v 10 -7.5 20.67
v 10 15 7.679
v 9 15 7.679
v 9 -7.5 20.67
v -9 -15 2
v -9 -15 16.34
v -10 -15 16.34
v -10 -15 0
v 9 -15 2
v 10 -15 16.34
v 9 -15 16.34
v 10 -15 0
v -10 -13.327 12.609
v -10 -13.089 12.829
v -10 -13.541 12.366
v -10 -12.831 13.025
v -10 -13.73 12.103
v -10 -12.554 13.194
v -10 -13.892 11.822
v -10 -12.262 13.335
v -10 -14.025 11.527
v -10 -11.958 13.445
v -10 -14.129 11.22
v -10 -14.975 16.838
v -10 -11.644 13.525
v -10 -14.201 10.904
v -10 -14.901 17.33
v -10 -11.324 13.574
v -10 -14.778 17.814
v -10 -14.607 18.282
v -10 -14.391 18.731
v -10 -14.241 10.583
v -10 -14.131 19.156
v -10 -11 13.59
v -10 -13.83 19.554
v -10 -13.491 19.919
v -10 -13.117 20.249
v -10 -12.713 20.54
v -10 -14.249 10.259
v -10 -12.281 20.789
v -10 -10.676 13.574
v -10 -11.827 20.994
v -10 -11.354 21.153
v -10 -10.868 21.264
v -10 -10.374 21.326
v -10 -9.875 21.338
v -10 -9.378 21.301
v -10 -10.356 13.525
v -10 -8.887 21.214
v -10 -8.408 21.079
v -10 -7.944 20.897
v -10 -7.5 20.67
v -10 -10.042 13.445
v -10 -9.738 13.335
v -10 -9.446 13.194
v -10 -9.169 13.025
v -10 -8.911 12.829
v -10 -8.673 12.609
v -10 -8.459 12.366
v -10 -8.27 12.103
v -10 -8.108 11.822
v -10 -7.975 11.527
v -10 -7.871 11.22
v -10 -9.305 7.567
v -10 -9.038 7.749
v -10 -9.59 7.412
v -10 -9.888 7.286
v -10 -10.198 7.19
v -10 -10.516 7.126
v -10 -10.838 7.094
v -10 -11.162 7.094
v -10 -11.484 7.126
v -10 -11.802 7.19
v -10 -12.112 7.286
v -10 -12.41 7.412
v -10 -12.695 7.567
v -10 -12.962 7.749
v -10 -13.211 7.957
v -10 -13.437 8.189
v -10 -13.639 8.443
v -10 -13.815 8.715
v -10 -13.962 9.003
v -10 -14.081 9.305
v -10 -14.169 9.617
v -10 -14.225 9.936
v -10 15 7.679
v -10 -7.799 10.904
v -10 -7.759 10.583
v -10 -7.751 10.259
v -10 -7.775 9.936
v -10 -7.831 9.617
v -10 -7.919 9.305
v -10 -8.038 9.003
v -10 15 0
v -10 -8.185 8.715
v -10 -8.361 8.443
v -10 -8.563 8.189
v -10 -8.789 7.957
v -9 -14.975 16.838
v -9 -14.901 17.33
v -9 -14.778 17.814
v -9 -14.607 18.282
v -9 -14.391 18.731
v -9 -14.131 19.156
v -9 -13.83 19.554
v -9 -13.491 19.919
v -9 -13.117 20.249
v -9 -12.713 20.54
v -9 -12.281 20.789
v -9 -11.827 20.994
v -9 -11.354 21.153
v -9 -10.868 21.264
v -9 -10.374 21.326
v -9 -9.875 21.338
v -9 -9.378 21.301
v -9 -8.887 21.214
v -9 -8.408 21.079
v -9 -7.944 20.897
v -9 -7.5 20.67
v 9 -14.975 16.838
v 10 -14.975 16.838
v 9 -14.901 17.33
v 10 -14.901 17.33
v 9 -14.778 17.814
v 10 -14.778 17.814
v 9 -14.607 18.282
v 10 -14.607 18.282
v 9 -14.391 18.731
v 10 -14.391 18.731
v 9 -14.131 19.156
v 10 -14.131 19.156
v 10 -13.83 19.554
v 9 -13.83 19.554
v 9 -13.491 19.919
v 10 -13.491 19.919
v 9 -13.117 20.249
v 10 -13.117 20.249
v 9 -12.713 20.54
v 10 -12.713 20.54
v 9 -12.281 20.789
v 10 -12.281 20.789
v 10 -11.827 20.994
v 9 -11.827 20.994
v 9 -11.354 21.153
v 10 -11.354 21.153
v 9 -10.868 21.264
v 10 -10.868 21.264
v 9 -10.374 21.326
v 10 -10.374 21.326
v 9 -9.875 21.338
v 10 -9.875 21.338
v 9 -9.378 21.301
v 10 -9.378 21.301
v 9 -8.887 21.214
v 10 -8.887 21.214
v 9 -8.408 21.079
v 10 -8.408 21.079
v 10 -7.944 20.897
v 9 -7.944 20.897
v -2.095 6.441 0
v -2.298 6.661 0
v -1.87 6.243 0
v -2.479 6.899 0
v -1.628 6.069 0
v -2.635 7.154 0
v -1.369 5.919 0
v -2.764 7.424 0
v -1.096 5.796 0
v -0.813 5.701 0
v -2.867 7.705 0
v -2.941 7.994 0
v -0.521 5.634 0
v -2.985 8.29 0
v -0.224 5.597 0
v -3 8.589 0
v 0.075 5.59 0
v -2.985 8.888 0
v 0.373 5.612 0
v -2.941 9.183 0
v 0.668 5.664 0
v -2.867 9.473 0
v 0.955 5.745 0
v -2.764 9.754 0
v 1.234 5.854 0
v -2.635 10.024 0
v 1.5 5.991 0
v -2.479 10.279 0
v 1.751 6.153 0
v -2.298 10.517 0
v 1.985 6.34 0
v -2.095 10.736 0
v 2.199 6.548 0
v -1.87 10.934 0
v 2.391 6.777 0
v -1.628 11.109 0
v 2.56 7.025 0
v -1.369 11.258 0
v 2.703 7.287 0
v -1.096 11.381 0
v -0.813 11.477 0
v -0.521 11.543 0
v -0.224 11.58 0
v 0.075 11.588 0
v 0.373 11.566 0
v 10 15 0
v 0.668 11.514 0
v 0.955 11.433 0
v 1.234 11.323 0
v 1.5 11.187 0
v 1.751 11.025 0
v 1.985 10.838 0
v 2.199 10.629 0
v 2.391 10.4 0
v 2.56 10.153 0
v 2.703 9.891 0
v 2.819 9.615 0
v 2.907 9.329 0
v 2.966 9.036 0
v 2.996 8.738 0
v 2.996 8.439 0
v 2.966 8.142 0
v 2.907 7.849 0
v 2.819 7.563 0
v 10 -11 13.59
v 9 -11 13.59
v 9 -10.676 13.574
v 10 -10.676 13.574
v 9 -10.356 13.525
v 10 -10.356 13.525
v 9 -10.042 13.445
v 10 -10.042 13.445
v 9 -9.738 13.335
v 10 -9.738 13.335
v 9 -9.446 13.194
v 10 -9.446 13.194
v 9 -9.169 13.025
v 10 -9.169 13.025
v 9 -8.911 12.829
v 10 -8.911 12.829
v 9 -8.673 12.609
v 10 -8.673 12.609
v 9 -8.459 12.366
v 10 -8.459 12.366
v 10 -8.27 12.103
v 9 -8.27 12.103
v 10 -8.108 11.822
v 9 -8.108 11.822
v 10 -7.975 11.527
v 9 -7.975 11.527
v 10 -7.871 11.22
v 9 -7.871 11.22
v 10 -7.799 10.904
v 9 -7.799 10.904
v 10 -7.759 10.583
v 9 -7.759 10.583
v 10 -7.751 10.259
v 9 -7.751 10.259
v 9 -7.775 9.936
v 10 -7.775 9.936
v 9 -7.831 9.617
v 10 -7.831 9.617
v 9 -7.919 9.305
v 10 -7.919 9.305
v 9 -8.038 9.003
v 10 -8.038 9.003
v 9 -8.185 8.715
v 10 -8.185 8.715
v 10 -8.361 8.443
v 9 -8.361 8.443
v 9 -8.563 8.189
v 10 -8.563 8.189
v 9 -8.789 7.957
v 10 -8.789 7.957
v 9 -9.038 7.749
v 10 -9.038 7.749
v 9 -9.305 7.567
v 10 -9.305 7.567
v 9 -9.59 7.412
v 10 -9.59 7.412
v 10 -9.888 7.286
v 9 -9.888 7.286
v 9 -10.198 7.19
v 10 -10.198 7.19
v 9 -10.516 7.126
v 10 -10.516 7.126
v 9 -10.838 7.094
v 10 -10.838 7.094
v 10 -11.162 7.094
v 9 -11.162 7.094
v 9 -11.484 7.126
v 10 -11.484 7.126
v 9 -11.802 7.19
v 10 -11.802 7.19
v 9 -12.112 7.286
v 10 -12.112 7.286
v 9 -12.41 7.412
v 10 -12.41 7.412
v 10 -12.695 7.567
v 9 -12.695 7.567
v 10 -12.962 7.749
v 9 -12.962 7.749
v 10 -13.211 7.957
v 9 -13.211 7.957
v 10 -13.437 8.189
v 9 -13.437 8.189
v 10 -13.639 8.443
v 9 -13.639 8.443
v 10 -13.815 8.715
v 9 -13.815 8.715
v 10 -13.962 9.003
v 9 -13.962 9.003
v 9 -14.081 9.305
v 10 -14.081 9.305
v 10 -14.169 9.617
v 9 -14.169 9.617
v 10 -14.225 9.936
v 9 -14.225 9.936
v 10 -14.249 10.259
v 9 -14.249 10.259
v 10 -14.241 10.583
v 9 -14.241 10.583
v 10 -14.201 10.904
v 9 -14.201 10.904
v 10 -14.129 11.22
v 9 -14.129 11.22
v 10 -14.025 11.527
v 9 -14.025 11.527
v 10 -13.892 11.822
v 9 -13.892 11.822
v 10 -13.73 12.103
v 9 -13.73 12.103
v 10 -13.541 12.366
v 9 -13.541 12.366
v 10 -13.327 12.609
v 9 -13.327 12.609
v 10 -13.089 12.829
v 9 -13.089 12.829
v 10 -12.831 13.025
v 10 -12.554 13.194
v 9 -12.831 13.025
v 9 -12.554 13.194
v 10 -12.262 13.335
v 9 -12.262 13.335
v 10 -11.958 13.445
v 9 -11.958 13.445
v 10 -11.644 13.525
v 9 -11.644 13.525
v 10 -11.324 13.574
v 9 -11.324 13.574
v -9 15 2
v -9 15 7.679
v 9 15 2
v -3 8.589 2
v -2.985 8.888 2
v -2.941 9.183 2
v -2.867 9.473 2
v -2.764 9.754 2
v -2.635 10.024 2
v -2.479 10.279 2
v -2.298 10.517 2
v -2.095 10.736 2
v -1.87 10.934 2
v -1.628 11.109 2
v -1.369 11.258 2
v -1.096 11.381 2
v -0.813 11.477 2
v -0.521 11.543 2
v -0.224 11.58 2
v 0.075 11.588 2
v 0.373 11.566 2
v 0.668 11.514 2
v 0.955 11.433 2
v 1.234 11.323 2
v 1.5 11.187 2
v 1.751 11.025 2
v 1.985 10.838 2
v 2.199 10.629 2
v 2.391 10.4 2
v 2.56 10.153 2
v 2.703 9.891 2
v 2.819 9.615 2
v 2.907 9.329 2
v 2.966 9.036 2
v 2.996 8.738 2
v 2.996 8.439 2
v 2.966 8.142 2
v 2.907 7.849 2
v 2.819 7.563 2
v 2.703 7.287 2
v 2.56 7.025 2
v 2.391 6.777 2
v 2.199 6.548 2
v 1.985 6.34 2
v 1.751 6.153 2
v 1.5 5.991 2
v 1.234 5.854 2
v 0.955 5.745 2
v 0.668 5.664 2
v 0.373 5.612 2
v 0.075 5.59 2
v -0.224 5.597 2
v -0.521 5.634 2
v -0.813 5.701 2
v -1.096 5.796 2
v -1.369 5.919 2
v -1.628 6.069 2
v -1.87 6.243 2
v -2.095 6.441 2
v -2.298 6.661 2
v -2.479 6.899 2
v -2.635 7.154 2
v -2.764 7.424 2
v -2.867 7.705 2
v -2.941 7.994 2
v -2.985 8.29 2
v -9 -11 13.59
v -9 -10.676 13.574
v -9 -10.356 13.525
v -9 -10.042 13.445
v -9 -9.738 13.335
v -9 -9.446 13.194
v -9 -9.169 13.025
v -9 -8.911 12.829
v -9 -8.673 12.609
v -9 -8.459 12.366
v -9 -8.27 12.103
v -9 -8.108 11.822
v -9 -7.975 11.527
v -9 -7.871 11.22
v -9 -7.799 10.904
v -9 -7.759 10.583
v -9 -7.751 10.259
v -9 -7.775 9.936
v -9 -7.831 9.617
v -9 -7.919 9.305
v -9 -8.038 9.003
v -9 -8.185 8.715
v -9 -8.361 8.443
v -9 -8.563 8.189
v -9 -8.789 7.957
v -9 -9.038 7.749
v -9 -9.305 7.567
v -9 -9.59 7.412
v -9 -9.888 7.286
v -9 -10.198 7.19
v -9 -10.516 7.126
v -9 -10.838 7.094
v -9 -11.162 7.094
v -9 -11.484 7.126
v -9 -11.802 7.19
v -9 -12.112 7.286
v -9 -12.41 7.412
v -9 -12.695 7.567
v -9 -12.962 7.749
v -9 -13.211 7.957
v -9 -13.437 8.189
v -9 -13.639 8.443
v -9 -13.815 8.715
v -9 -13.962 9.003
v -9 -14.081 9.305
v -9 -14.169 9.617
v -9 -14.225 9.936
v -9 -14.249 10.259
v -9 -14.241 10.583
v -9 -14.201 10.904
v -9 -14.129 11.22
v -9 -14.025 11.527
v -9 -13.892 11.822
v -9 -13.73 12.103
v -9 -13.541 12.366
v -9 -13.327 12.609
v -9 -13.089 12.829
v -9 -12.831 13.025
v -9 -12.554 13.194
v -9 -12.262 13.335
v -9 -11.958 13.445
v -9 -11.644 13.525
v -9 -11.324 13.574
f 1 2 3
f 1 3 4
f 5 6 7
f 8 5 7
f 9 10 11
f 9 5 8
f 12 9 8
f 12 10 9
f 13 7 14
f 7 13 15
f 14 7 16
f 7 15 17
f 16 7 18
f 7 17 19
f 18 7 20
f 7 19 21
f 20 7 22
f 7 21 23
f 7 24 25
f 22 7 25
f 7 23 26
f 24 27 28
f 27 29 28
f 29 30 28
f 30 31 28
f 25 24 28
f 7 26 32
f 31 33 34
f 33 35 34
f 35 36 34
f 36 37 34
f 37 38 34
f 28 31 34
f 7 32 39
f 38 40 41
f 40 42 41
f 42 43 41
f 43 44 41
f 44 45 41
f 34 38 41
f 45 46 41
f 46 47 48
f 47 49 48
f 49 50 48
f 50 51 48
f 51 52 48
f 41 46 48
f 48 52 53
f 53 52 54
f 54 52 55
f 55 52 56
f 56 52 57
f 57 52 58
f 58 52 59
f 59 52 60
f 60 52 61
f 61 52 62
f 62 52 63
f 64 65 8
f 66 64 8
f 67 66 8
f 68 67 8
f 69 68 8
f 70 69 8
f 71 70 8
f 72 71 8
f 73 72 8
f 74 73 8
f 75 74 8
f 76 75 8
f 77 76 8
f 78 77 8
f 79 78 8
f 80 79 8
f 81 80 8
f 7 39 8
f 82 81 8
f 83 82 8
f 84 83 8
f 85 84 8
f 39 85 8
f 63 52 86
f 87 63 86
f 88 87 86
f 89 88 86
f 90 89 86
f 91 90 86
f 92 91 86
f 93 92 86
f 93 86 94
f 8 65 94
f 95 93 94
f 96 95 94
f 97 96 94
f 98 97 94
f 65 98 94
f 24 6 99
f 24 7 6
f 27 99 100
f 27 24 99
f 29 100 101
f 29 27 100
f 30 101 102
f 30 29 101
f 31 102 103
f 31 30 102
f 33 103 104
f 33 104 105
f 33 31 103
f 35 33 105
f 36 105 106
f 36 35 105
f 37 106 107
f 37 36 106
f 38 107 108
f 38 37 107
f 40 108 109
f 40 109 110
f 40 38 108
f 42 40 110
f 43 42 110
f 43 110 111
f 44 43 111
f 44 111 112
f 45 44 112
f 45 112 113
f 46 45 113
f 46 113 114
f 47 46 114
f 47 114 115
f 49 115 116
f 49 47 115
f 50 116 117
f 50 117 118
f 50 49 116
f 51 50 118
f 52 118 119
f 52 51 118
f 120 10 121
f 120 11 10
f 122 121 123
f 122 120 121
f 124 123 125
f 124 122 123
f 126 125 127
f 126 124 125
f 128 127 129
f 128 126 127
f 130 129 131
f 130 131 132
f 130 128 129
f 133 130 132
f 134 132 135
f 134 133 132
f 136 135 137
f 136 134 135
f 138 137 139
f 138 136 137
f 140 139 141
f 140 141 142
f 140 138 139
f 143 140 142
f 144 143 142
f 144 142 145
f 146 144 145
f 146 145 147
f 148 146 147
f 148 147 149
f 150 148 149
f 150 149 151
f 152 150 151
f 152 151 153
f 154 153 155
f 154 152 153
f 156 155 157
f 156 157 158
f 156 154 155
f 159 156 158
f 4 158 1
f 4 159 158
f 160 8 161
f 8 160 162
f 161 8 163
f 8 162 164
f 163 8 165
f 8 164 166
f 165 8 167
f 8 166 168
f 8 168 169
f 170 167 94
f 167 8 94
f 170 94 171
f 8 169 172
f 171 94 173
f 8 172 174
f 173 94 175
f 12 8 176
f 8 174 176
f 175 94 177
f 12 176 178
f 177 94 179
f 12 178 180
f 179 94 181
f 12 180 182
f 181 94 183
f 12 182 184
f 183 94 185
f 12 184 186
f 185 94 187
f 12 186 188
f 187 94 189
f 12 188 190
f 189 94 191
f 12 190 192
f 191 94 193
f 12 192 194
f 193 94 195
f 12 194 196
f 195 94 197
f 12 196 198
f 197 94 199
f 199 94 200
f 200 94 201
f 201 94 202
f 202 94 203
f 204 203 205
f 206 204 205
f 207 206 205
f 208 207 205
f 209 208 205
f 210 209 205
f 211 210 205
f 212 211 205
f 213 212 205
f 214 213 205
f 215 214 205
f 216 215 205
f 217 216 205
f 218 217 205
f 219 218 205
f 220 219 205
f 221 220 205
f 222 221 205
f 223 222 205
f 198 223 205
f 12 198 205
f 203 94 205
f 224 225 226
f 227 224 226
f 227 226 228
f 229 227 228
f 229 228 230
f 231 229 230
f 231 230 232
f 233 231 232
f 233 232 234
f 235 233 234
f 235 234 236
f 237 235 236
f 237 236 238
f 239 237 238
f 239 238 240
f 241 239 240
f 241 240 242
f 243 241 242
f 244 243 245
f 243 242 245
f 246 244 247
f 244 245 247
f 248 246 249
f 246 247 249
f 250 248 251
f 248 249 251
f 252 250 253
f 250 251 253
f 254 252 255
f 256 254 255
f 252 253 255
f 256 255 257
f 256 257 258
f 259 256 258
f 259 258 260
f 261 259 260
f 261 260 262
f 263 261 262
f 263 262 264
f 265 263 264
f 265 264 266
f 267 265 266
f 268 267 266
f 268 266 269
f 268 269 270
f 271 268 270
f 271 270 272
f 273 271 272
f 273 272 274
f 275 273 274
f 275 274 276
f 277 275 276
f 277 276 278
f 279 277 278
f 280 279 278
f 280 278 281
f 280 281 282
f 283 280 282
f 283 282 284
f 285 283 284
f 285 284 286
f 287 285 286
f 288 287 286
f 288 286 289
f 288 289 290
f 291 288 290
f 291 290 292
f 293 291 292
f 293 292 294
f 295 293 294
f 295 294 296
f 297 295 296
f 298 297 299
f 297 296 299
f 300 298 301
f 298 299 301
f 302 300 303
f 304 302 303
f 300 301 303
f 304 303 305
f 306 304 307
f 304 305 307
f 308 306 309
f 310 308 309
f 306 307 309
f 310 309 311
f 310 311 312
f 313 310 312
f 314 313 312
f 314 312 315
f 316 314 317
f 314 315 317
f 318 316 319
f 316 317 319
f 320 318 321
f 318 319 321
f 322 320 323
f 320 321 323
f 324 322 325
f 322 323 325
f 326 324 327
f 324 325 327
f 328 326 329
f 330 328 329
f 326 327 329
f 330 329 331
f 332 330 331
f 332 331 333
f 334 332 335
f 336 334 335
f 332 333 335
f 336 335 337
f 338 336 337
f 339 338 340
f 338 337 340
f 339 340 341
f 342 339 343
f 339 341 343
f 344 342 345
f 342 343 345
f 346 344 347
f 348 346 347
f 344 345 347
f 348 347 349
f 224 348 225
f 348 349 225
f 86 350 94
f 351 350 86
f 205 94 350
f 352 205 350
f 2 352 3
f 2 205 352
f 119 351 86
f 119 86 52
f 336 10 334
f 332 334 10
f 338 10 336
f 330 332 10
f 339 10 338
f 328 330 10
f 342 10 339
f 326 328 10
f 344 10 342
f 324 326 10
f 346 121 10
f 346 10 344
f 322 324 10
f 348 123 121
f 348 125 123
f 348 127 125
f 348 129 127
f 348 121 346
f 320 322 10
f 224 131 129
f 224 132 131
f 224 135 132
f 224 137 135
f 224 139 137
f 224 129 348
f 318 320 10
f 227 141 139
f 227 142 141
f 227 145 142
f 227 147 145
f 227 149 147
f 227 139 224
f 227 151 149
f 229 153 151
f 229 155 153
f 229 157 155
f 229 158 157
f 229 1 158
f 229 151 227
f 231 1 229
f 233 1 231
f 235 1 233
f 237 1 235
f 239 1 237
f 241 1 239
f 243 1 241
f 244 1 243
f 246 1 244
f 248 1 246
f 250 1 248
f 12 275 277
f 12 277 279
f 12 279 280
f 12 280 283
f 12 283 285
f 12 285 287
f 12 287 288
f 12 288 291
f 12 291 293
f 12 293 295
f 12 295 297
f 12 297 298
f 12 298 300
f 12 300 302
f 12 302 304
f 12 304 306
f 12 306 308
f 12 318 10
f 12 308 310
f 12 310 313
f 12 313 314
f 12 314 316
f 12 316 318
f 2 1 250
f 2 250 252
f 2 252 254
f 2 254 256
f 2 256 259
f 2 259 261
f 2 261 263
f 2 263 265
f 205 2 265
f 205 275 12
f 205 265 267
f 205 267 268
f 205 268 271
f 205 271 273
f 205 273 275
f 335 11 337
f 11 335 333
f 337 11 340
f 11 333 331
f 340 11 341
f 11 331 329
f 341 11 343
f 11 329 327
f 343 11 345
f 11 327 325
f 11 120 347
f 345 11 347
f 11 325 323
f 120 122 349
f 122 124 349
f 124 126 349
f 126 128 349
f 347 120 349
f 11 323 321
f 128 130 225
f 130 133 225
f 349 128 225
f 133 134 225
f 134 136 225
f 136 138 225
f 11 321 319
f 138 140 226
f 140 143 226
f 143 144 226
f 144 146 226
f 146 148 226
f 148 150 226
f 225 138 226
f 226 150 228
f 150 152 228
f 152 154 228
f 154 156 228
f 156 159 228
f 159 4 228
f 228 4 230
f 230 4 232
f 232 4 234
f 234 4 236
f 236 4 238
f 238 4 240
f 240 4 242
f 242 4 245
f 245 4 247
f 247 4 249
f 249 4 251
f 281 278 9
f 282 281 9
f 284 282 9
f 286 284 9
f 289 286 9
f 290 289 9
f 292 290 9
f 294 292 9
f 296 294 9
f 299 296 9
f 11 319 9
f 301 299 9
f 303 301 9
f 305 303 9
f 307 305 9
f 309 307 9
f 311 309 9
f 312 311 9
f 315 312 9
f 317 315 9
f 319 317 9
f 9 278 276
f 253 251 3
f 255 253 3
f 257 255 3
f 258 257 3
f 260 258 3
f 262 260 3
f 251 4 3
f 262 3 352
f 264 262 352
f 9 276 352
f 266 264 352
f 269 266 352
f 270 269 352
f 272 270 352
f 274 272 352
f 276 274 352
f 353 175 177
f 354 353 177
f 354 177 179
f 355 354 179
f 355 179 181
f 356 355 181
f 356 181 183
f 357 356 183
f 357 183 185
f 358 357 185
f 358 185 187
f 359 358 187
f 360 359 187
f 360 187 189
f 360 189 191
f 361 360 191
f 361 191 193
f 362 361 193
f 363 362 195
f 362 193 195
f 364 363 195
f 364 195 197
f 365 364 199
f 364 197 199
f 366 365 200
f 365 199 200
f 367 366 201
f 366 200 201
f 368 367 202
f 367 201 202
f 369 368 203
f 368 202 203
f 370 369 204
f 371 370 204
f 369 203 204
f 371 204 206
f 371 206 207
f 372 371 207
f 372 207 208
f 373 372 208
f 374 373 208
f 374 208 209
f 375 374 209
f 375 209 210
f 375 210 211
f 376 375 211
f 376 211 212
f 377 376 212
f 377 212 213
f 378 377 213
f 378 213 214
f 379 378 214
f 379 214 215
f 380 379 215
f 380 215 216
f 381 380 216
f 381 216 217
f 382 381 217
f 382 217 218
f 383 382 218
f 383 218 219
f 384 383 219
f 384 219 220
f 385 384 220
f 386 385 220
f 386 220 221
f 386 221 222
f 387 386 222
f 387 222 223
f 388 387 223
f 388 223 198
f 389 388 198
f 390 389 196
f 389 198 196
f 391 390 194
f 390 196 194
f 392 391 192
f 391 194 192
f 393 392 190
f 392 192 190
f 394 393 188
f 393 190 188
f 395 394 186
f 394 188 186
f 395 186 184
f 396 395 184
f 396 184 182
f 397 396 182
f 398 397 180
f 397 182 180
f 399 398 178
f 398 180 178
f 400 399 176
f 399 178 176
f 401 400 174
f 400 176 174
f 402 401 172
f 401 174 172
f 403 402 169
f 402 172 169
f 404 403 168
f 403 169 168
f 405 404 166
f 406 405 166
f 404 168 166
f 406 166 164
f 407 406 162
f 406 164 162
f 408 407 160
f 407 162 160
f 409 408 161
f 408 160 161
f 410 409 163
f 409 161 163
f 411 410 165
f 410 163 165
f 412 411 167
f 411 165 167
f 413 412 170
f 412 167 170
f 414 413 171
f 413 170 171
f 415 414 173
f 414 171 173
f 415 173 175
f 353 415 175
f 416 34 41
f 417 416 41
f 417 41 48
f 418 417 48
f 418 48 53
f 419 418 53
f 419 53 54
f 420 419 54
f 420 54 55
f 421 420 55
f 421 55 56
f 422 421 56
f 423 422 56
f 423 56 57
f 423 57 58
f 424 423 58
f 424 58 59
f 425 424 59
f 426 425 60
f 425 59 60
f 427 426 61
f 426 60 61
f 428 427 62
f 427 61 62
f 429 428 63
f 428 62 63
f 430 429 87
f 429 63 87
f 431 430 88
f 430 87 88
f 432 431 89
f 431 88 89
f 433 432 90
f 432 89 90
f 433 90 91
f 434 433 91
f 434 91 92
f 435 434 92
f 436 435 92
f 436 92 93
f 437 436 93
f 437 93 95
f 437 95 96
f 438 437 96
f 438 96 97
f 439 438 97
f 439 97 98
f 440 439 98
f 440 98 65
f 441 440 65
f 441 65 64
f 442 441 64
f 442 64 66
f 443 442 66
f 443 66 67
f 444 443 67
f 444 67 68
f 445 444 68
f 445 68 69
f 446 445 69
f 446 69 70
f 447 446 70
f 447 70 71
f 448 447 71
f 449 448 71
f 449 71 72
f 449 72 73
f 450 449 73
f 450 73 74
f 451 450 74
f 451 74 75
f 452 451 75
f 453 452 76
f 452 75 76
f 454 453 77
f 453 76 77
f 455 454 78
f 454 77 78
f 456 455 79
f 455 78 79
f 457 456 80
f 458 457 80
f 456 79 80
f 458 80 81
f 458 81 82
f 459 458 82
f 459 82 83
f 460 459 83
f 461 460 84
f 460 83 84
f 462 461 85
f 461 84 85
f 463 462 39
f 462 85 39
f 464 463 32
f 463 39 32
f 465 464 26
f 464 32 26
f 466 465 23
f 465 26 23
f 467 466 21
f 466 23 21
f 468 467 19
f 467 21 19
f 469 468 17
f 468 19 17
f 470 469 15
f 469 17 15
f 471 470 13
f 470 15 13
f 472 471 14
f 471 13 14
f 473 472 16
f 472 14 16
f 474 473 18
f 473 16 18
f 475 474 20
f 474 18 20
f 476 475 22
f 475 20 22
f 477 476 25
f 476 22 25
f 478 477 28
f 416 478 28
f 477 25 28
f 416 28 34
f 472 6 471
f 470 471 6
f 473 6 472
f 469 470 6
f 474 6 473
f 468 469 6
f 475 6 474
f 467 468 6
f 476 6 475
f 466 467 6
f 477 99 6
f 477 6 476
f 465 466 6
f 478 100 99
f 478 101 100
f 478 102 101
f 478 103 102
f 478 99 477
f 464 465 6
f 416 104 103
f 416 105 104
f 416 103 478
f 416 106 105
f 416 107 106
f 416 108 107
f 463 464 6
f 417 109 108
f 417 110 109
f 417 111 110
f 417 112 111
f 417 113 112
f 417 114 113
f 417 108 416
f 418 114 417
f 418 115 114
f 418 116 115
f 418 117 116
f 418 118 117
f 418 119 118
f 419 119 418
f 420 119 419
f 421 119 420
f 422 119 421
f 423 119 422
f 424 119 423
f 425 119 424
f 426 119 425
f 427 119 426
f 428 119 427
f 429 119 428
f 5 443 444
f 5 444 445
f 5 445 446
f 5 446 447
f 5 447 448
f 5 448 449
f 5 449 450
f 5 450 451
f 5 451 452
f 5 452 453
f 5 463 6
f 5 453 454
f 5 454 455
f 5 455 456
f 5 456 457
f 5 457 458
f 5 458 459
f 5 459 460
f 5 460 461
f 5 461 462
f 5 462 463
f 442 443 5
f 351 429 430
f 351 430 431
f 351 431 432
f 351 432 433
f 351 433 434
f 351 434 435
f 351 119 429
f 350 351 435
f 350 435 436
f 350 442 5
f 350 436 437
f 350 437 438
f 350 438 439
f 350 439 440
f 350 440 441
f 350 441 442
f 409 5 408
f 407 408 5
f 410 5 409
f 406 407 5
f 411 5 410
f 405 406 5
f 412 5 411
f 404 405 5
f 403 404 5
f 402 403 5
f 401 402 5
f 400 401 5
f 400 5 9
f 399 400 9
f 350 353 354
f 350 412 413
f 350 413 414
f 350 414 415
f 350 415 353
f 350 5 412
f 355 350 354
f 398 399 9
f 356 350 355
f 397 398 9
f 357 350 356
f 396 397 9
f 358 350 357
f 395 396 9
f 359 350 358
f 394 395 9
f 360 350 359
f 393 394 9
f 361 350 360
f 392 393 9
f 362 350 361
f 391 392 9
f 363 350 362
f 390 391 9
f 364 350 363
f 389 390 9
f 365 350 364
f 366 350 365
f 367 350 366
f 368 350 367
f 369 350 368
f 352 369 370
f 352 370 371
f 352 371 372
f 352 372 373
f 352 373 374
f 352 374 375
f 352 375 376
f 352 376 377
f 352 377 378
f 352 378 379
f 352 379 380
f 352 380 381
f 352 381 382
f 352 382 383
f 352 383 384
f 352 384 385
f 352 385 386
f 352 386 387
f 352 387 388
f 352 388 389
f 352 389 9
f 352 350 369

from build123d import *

# Parameters (mm, degrees)
SKETCH1_W           = 20
SKETCH1_H           = 30
BOSS_EXTRUDE1_DEPTH = 2
BOSS_EXTRUDE2_DEPTH = 1
LPATTERN1_COUNT     = 2
LPATTERN1_PITCH     = 19
FILLET1_R           = 5
FILLET2_R           = 5
SKETCH3_R           = 3.25
CUT_EXTRUDE1_DEPTH  = 33.869206831
SKETCH4_R           = 3
CUT_EXTRUDE2_DEPTH  = 28.935367507


with BuildPart() as part:
    # Sketch1 → Boss-Extrude1 (new body)
    with BuildSketch(Plane.XY):
        Rectangle(SKETCH1_W, SKETCH1_H)
    extrude(amount=BOSS_EXTRUDE1_DEPTH)

    # Sketch2 → Boss-Extrude2 (add)
    with BuildSketch(Plane(origin=(10, 0, 0), x_dir=(0, 0, -1), z_dir=(1, 0, 0))):
        Polygon((-2, 15), (-7.679491924, 15), (-25, -15), (-2, -15), align=None)
    boss_extrude2 = extrude(amount=-BOSS_EXTRUDE2_DEPTH)

    # LPattern1: Boss-Extrude2 ×2
    with Locations(*[(-i * LPATTERN1_PITCH, 0, 0) for i in range(1, LPATTERN1_COUNT)]):
        add(boss_extrude2)

    # Fillet1
    fillet1_edges = [part.edges().sort_by_distance(p)[0] for p in [
        (-9.5, -15, 25),
    ]]
    fillet(fillet1_edges, radius=FILLET1_R)

    # Fillet2
    fillet2_edges = [part.edges().sort_by_distance(p)[0] for p in [
        (9.5, -15, 25),
    ]]
    fillet(fillet2_edges, radius=FILLET2_R)

    # Sketch3 → Cut-Extrude1 (cut, through all)
    with BuildSketch(Plane.ZY.offset(10)):
        with Locations((10.339745962, -11)):
            Circle(SKETCH3_R)
    extrude(amount=-CUT_EXTRUDE1_DEPTH, mode=Mode.SUBTRACT)

    # Sketch4 → Cut-Extrude2 (cut, through all)
    with BuildSketch(Plane(origin=(0, 0, 0), x_dir=(-1, 0, 0), z_dir=(0, 0, -1))):
        with Locations((0, 8.588876522)):
            Circle(SKETCH4_R)
    extrude(amount=-CUT_EXTRUDE2_DEPTH, mode=Mode.SUBTRACT)


solid = part.part
